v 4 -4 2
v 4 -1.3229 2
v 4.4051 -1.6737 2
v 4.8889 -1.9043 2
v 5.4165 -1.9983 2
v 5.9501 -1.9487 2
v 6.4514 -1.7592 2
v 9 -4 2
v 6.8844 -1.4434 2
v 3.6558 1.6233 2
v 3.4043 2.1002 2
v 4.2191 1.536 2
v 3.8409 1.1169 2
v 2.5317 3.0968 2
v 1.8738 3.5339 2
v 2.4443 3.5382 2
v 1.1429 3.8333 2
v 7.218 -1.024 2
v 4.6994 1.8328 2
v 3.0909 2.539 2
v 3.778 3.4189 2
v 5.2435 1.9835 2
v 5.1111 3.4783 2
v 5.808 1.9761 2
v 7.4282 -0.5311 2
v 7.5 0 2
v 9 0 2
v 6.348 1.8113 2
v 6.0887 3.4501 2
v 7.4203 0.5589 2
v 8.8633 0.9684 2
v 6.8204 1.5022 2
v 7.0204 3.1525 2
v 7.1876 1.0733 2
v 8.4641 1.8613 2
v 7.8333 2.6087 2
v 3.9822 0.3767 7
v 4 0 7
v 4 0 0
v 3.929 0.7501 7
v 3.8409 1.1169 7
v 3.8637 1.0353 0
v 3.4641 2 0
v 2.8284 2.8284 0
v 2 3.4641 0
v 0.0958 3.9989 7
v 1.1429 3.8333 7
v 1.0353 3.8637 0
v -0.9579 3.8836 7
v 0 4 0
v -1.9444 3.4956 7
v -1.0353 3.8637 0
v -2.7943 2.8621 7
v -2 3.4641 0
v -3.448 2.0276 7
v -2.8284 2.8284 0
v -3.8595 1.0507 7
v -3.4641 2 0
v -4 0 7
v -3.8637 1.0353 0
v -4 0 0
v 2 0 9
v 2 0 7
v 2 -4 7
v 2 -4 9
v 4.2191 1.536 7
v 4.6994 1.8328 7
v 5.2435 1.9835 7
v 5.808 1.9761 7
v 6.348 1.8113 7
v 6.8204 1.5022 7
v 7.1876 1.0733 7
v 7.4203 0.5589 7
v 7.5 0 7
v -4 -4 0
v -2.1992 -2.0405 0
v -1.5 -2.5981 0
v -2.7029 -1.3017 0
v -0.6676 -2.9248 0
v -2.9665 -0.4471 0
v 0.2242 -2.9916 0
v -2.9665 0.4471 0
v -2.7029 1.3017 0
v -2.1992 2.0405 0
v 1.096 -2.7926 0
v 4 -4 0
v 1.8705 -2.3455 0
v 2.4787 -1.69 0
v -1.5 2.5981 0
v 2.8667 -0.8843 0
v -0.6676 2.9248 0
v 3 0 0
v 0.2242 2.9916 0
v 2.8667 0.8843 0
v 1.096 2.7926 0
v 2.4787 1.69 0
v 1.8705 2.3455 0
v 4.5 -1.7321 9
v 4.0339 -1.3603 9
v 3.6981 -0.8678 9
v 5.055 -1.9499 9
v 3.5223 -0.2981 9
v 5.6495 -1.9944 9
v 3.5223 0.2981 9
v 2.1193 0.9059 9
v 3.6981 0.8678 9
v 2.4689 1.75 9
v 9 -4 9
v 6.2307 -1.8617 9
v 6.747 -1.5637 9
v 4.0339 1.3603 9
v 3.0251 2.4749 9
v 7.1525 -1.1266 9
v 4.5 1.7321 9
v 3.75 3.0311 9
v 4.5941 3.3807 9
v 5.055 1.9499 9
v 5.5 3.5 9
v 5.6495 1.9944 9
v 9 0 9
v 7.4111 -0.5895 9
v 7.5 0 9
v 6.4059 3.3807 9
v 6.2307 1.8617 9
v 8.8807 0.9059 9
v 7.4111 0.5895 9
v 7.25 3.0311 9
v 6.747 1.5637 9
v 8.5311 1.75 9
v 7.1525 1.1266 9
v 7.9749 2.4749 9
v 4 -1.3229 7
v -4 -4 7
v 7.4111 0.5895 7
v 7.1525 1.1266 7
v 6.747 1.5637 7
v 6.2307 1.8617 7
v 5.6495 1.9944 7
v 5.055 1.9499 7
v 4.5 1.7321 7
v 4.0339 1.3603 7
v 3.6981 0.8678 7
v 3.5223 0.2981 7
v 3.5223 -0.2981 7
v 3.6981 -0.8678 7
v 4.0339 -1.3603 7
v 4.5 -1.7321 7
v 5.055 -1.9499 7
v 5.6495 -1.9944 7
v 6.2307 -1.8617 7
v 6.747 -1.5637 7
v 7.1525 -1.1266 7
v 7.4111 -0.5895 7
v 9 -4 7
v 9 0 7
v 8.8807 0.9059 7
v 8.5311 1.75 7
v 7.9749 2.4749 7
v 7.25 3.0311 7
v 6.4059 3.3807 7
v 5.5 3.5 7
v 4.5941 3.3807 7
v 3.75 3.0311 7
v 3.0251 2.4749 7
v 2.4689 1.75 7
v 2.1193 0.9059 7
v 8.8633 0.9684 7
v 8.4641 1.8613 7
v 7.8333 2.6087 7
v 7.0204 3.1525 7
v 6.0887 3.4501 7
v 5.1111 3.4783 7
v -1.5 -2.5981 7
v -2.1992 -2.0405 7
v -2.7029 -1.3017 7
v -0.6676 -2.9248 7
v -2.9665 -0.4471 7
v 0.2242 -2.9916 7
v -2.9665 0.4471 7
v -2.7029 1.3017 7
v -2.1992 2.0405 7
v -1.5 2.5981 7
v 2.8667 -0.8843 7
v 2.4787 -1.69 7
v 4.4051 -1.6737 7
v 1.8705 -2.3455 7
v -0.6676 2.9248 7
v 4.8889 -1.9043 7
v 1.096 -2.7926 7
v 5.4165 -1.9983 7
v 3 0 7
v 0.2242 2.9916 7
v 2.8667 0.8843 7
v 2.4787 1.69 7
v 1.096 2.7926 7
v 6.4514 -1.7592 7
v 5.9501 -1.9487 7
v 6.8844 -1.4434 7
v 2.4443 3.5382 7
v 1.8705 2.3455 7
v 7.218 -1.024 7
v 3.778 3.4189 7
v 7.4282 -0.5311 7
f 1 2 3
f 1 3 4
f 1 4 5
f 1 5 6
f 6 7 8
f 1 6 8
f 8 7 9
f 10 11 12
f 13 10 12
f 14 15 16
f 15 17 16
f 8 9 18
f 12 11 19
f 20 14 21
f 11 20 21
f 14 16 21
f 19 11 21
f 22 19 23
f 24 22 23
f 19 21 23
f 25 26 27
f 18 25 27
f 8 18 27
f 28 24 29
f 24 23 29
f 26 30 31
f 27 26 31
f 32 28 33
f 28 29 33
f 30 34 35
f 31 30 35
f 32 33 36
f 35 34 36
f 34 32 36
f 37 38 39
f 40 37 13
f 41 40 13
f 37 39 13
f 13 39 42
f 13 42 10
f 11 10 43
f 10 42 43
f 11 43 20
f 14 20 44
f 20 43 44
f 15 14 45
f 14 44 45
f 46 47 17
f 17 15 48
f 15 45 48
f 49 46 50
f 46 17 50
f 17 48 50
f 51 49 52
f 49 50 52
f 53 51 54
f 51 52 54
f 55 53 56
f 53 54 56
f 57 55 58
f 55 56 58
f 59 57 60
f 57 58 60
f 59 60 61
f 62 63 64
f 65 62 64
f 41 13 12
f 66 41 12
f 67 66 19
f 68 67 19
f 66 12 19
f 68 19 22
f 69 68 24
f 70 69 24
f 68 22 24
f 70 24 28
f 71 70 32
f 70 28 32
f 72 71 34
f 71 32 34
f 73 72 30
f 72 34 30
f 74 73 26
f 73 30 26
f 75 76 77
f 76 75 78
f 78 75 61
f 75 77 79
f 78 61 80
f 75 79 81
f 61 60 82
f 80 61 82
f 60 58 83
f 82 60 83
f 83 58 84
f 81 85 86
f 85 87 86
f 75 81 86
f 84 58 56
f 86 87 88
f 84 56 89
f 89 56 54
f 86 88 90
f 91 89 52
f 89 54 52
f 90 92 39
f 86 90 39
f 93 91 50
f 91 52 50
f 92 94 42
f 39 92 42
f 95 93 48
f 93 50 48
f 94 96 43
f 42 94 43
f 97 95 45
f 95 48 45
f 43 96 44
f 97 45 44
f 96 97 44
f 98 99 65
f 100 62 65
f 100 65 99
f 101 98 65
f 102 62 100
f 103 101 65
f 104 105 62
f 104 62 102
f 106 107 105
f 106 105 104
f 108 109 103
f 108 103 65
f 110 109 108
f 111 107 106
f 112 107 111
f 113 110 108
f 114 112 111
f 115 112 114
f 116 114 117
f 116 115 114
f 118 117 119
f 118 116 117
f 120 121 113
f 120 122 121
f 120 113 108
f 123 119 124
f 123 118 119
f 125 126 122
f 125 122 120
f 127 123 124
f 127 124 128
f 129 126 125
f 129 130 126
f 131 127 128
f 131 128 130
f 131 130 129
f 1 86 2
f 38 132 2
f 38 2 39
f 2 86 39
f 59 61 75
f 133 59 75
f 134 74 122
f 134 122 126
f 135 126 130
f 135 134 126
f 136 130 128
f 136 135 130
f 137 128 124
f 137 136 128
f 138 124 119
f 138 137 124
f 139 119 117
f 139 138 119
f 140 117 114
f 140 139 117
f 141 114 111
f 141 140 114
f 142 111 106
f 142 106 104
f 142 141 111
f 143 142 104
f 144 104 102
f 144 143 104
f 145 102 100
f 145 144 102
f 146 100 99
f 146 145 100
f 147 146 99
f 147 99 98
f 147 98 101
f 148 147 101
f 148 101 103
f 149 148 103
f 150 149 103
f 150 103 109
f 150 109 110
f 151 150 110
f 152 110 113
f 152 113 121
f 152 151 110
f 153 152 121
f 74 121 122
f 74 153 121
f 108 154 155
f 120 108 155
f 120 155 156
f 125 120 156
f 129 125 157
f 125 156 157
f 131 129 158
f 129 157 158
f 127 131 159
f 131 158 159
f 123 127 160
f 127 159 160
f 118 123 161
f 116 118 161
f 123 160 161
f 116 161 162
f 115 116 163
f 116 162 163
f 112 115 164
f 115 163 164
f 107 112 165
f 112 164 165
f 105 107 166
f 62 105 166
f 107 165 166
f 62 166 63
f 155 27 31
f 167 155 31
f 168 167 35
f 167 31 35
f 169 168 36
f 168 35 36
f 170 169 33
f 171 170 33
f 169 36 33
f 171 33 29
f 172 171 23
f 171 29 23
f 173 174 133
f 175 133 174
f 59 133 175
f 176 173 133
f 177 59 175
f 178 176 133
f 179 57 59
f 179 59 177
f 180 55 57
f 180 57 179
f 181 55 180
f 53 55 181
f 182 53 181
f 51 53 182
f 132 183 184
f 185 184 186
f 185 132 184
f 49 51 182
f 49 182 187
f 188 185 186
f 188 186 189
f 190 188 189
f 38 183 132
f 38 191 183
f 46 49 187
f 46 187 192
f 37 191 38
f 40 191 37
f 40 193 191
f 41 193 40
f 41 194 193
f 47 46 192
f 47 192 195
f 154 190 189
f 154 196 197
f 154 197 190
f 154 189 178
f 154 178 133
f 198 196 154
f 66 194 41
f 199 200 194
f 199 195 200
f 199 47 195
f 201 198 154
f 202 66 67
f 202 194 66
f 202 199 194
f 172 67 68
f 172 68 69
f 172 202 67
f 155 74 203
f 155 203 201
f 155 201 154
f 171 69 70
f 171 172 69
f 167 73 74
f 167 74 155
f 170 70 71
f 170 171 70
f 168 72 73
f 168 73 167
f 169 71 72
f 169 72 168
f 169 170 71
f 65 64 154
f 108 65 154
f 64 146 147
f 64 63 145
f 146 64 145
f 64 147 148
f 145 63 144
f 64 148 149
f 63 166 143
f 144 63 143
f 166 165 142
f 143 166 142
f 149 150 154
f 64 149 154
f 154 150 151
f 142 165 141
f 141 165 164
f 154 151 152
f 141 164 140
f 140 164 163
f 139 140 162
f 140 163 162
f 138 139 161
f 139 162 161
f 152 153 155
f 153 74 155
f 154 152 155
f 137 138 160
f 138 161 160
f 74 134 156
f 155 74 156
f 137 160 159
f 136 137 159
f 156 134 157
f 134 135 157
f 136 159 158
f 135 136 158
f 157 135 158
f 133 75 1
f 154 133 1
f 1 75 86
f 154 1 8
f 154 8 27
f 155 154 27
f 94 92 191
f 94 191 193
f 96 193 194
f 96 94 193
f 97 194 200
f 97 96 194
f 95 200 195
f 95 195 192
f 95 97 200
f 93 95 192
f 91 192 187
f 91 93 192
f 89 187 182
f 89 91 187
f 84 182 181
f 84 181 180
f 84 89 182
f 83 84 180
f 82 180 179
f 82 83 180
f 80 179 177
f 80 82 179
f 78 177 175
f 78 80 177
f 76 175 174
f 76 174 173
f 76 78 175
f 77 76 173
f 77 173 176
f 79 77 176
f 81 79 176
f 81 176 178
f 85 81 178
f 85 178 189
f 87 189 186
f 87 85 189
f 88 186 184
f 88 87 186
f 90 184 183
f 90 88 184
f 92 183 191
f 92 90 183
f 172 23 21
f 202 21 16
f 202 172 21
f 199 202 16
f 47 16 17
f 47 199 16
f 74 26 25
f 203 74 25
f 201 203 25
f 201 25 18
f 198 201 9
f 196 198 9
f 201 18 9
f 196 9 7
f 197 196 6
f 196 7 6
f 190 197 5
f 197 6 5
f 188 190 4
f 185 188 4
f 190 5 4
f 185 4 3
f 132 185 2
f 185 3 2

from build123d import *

# Parameters (mm, degrees)
SKETCH2_R           = 3
BOSS_EXTRUDE1_DEPTH = 7
BOSS_EXTRUDE2_START = -5
BOSS_EXTRUDE2_DEPTH = 5
SKETCH3_3_R         = 2
BOSS_EXTRUDE4_DEPTH = 2
FILLET1_R           = 10


with BuildPart() as part:
    # Sketch2 → Boss-Extrude1 (new body)
    with BuildSketch(Plane.XY):
        with BuildLine():
            Line((-4, 0), (-4, -4))
            Line((-4, -4), (4, -4))
            Line((4, -4), (4, 0))
            ThreePointArc((4, 0), (0, 4), (-4, 0))
        make_face()
        Circle(SKETCH2_R, mode=Mode.SUBTRACT)
    extrude(amount=BOSS_EXTRUDE1_DEPTH)

    # Sketch3 → Boss-Extrude2 (add)
    with BuildSketch(Plane.XY.offset(7).offset(BOSS_EXTRUDE2_START)):
        with BuildLine():
            ThreePointArc((9, 0), (6.881698559, 3.215728392), (3.090909091, 2.538952735))
            ThreePointArc((3.090909091, 2.538952735), (3.538092662, 1.86598508), (3.840909091, 1.116878398))
            ThreePointArc((3.840909091, 1.116878398), (6.083874208, 1.912875038), (7.5, 0))
            ThreePointArc((7.5, 0), (6.207106781, -1.870828693), (4, -1.322875656))
            Line((4, -1.322875656), (4, -4))
            Line((4, -4), (9, -4))
            Line((9, -4), (9, 0))
        make_face()
    extrude(amount=BOSS_EXTRUDE2_DEPTH)

    # Fillet1
    fillet1_edges = [part.edges().sort_by_distance(p)[0] for p in [
        (3.090909091, 2.538952735, 4.5),
    ]]
    fillet(fillet1_edges, radius=FILLET1_R)


with BuildPart() as body_2:
    # Sketch3<3> → Boss-Extrude4 (new body)
    with BuildSketch(Plane.XY.offset(7)):
        with BuildLine():
            Line((2, 0), (2, -4))
            Line((2, -4), (9, -4))
            Line((9, -4), (9, 0))
            ThreePointArc((9, 0), (5.5, 3.5), (2, 0))
        make_face()
        with Locations((5.5, 0)):
            Circle(SKETCH3_3_R, mode=Mode.SUBTRACT)
    extrude(amount=BOSS_EXTRUDE4_DEPTH)


solid = Compound([part.part, body_2.part])
